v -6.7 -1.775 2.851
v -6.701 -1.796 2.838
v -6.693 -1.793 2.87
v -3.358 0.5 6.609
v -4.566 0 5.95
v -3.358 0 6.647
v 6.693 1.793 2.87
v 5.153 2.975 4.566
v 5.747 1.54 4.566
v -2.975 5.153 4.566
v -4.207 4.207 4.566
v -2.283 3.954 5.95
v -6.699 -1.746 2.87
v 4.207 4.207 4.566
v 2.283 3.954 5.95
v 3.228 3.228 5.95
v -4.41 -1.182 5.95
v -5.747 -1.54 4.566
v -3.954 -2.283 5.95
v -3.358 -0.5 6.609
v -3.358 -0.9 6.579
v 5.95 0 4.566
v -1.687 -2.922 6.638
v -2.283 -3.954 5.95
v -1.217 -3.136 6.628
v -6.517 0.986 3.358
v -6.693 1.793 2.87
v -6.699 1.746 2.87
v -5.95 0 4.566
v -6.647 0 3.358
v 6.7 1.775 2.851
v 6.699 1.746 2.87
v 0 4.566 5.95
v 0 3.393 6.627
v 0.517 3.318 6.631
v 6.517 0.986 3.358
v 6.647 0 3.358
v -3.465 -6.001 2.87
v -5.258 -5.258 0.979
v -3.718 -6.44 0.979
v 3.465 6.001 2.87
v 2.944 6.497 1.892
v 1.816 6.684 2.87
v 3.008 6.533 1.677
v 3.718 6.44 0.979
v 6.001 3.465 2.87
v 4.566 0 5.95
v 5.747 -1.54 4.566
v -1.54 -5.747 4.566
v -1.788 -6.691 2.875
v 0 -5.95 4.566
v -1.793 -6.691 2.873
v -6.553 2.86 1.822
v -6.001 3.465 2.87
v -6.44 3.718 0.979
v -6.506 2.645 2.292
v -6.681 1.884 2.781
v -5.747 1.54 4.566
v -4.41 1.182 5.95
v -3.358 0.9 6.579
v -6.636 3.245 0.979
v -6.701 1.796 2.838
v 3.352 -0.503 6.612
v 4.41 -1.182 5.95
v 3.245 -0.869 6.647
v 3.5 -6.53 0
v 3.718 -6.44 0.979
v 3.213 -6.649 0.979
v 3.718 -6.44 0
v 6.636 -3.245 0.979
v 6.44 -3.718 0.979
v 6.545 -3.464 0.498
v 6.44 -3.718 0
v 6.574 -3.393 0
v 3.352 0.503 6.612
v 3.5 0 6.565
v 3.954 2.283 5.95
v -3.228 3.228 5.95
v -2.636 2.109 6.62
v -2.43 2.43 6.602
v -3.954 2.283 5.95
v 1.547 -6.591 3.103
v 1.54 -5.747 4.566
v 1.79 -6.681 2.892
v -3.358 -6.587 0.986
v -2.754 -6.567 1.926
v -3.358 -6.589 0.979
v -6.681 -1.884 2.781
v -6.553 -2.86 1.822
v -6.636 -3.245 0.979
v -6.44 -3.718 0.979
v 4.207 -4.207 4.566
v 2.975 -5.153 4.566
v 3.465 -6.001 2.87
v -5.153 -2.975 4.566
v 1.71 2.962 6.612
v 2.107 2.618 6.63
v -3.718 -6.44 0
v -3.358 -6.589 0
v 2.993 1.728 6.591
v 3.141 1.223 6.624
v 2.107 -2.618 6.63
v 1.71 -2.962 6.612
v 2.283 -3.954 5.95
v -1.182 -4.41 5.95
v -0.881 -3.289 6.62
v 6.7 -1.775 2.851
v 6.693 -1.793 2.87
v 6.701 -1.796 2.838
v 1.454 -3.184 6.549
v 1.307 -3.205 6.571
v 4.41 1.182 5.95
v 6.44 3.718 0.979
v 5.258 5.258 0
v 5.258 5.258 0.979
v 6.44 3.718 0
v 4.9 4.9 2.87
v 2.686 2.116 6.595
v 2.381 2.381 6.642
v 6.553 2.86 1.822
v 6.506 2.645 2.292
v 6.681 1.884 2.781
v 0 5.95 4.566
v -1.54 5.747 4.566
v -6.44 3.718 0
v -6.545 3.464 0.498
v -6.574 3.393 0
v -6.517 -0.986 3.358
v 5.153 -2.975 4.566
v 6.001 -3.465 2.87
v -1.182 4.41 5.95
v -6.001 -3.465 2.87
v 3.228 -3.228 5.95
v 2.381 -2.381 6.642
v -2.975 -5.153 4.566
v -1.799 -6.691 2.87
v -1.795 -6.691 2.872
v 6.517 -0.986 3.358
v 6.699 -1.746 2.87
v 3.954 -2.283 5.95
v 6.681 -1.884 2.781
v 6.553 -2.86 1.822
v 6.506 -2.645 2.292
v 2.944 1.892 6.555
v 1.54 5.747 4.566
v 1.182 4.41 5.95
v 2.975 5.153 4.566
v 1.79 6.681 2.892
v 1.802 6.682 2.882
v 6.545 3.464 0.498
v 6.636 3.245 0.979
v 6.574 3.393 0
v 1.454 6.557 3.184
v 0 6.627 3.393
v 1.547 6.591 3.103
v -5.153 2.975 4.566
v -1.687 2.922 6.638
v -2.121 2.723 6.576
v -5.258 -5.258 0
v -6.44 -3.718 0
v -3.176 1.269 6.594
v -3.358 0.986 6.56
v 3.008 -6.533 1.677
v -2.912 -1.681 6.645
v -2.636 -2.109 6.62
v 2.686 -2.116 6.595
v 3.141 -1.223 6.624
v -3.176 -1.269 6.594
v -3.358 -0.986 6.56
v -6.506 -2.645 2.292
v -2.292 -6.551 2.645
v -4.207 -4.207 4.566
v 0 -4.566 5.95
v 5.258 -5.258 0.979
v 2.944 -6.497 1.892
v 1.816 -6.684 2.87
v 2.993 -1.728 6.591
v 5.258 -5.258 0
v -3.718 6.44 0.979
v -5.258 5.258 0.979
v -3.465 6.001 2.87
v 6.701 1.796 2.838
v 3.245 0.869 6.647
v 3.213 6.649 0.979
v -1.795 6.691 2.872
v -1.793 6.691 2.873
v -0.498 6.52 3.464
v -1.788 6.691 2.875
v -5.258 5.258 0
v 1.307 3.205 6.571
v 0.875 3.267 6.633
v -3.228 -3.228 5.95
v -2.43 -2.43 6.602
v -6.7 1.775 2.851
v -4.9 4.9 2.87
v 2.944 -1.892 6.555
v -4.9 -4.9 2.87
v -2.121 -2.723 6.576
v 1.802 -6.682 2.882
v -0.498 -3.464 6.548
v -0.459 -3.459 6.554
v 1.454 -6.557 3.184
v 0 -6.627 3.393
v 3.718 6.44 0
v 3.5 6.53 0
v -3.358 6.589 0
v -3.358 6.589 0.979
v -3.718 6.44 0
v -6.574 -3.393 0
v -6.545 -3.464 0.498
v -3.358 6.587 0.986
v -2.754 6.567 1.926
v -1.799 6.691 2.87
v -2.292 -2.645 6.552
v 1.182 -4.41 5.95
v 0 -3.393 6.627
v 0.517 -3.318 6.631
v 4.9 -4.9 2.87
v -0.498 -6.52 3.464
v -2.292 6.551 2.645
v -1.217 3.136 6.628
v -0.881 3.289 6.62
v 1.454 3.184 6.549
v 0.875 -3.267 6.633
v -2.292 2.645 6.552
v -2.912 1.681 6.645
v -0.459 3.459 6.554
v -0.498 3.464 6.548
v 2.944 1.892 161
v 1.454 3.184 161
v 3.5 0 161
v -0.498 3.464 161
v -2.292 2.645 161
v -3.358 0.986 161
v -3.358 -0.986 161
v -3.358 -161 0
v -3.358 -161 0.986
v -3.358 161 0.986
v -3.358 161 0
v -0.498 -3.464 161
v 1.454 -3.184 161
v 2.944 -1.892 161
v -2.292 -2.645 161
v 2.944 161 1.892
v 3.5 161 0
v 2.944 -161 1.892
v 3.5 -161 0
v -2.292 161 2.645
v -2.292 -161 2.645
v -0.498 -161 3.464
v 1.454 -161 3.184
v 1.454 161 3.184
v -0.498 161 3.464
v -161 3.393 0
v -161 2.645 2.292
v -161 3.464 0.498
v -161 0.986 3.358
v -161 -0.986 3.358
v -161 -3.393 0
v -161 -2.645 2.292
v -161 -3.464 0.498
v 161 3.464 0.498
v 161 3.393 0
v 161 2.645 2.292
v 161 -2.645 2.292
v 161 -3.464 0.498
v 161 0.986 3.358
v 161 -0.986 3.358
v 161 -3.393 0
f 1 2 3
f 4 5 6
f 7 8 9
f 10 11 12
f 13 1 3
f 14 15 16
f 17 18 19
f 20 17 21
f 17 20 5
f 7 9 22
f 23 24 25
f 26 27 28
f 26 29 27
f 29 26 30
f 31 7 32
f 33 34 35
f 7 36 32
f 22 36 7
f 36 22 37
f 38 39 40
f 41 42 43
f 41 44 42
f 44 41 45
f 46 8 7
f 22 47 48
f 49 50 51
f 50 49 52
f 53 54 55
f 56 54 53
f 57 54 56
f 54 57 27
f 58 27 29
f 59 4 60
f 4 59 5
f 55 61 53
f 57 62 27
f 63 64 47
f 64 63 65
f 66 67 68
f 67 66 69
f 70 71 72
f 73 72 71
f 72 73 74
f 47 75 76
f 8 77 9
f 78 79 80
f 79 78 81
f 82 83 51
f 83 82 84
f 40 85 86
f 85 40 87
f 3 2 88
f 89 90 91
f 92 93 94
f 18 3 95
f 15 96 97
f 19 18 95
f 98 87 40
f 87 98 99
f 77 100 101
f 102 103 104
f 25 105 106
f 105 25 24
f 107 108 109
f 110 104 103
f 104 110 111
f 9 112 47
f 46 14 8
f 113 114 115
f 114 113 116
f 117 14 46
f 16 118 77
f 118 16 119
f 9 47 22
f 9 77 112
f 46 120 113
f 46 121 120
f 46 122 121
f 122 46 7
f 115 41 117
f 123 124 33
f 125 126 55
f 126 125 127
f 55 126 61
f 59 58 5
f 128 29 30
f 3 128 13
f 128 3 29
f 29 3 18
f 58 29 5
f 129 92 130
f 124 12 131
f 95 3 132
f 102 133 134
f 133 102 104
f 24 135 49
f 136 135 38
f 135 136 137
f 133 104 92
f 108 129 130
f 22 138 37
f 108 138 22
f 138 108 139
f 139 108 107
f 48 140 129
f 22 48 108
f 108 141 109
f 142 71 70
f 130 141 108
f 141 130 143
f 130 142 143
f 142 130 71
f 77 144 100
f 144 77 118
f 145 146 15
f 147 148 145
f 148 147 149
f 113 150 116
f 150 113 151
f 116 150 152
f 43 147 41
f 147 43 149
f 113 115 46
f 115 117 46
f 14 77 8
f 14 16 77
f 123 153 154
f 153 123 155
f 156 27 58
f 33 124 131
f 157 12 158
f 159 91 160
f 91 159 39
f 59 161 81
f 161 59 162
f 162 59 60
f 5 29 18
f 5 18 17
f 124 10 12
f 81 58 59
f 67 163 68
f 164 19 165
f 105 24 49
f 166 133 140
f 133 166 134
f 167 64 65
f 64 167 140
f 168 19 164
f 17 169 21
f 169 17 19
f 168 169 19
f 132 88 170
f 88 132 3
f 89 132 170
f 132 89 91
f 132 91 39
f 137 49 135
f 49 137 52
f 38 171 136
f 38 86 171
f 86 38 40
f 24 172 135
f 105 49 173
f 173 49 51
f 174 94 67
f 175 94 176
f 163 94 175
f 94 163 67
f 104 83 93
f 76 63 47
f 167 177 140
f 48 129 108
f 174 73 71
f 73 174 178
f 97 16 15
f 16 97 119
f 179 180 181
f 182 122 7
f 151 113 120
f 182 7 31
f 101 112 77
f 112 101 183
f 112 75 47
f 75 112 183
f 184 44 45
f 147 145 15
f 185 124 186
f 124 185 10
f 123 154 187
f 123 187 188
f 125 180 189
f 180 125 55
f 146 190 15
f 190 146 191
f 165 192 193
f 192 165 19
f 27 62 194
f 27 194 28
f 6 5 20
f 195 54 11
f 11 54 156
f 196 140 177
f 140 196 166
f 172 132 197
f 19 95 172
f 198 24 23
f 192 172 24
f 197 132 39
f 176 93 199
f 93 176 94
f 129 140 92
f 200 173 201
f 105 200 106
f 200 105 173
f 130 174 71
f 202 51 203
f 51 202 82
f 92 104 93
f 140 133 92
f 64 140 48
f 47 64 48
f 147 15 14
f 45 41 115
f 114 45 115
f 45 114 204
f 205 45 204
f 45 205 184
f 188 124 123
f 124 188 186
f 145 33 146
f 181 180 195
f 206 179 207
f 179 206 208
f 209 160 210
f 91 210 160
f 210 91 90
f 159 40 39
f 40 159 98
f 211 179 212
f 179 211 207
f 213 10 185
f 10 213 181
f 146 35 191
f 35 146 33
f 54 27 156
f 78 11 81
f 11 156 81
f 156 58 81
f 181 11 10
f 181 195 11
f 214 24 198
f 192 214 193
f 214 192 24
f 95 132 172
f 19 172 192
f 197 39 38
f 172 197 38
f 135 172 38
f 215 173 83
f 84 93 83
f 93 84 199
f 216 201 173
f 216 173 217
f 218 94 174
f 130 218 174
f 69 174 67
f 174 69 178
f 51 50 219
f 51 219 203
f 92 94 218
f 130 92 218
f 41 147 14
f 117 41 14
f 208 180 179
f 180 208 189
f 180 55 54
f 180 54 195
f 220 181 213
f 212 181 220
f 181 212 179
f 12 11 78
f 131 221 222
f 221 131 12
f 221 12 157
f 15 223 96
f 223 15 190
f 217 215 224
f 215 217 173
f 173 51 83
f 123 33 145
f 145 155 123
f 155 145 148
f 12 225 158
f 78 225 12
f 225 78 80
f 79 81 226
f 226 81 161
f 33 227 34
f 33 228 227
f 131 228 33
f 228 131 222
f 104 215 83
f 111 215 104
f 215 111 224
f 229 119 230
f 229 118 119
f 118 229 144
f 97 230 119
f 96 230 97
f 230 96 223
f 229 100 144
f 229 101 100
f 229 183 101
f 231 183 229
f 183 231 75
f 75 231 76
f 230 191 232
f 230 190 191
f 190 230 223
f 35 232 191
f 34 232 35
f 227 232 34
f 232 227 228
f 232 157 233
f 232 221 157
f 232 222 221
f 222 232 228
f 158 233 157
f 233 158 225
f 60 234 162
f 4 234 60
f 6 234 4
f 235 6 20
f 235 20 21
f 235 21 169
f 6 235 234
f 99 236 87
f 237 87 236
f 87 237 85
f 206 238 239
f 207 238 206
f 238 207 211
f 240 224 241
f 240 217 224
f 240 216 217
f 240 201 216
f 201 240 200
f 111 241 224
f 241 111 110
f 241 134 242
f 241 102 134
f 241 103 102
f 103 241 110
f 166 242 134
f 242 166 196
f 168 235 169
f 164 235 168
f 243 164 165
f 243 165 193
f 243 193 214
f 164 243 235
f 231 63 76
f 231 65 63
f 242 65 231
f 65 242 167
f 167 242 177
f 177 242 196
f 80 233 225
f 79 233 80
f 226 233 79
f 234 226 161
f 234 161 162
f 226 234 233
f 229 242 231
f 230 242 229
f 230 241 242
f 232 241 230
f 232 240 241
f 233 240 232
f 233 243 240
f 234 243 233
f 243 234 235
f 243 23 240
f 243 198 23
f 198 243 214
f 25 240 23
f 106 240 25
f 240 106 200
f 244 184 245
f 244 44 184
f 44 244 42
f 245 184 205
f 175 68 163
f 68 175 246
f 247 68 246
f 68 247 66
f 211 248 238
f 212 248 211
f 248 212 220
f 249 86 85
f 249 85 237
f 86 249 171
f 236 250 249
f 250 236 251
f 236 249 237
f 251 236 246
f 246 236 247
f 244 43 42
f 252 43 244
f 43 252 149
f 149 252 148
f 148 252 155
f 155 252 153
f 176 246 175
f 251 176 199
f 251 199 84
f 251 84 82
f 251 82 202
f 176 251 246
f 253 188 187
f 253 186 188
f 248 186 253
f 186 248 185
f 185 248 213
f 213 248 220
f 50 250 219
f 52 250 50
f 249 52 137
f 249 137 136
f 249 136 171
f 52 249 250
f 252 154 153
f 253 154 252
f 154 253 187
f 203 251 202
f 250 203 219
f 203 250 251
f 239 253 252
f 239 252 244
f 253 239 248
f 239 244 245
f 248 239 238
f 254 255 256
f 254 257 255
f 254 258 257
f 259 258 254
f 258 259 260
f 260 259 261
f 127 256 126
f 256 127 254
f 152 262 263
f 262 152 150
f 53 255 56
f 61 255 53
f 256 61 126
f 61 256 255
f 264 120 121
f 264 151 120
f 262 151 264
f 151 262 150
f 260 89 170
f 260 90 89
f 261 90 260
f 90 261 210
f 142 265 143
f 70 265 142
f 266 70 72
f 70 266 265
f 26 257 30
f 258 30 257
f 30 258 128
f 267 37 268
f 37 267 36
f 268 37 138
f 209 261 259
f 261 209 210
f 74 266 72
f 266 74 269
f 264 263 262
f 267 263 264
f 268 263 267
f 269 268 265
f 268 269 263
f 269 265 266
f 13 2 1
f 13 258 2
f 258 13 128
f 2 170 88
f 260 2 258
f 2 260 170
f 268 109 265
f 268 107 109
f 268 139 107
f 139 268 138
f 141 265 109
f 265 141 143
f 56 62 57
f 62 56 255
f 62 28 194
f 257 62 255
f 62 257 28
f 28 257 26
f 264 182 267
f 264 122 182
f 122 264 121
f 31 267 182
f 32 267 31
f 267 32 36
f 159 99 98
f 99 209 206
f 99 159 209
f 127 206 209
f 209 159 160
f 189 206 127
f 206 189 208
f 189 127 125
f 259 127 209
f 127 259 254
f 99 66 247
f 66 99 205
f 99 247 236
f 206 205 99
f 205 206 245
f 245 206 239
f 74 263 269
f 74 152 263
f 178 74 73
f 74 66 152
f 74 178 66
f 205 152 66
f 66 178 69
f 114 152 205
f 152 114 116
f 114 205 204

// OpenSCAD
difference(){
    union(){
        sphere(7.5);
        cylinder(h=322 , r = 3.5, center = true);
        rotate([90,0,0]){
            cylinder(h=322 , r = 3.5, center = true);
        }
        rotate([0,90,0]){
            cylinder(h=322 , r = 3.5, center = true);
        }
    }
    translate([0, 0, -161.5]){
        cube([323, 323, 323],true);
    }
}
